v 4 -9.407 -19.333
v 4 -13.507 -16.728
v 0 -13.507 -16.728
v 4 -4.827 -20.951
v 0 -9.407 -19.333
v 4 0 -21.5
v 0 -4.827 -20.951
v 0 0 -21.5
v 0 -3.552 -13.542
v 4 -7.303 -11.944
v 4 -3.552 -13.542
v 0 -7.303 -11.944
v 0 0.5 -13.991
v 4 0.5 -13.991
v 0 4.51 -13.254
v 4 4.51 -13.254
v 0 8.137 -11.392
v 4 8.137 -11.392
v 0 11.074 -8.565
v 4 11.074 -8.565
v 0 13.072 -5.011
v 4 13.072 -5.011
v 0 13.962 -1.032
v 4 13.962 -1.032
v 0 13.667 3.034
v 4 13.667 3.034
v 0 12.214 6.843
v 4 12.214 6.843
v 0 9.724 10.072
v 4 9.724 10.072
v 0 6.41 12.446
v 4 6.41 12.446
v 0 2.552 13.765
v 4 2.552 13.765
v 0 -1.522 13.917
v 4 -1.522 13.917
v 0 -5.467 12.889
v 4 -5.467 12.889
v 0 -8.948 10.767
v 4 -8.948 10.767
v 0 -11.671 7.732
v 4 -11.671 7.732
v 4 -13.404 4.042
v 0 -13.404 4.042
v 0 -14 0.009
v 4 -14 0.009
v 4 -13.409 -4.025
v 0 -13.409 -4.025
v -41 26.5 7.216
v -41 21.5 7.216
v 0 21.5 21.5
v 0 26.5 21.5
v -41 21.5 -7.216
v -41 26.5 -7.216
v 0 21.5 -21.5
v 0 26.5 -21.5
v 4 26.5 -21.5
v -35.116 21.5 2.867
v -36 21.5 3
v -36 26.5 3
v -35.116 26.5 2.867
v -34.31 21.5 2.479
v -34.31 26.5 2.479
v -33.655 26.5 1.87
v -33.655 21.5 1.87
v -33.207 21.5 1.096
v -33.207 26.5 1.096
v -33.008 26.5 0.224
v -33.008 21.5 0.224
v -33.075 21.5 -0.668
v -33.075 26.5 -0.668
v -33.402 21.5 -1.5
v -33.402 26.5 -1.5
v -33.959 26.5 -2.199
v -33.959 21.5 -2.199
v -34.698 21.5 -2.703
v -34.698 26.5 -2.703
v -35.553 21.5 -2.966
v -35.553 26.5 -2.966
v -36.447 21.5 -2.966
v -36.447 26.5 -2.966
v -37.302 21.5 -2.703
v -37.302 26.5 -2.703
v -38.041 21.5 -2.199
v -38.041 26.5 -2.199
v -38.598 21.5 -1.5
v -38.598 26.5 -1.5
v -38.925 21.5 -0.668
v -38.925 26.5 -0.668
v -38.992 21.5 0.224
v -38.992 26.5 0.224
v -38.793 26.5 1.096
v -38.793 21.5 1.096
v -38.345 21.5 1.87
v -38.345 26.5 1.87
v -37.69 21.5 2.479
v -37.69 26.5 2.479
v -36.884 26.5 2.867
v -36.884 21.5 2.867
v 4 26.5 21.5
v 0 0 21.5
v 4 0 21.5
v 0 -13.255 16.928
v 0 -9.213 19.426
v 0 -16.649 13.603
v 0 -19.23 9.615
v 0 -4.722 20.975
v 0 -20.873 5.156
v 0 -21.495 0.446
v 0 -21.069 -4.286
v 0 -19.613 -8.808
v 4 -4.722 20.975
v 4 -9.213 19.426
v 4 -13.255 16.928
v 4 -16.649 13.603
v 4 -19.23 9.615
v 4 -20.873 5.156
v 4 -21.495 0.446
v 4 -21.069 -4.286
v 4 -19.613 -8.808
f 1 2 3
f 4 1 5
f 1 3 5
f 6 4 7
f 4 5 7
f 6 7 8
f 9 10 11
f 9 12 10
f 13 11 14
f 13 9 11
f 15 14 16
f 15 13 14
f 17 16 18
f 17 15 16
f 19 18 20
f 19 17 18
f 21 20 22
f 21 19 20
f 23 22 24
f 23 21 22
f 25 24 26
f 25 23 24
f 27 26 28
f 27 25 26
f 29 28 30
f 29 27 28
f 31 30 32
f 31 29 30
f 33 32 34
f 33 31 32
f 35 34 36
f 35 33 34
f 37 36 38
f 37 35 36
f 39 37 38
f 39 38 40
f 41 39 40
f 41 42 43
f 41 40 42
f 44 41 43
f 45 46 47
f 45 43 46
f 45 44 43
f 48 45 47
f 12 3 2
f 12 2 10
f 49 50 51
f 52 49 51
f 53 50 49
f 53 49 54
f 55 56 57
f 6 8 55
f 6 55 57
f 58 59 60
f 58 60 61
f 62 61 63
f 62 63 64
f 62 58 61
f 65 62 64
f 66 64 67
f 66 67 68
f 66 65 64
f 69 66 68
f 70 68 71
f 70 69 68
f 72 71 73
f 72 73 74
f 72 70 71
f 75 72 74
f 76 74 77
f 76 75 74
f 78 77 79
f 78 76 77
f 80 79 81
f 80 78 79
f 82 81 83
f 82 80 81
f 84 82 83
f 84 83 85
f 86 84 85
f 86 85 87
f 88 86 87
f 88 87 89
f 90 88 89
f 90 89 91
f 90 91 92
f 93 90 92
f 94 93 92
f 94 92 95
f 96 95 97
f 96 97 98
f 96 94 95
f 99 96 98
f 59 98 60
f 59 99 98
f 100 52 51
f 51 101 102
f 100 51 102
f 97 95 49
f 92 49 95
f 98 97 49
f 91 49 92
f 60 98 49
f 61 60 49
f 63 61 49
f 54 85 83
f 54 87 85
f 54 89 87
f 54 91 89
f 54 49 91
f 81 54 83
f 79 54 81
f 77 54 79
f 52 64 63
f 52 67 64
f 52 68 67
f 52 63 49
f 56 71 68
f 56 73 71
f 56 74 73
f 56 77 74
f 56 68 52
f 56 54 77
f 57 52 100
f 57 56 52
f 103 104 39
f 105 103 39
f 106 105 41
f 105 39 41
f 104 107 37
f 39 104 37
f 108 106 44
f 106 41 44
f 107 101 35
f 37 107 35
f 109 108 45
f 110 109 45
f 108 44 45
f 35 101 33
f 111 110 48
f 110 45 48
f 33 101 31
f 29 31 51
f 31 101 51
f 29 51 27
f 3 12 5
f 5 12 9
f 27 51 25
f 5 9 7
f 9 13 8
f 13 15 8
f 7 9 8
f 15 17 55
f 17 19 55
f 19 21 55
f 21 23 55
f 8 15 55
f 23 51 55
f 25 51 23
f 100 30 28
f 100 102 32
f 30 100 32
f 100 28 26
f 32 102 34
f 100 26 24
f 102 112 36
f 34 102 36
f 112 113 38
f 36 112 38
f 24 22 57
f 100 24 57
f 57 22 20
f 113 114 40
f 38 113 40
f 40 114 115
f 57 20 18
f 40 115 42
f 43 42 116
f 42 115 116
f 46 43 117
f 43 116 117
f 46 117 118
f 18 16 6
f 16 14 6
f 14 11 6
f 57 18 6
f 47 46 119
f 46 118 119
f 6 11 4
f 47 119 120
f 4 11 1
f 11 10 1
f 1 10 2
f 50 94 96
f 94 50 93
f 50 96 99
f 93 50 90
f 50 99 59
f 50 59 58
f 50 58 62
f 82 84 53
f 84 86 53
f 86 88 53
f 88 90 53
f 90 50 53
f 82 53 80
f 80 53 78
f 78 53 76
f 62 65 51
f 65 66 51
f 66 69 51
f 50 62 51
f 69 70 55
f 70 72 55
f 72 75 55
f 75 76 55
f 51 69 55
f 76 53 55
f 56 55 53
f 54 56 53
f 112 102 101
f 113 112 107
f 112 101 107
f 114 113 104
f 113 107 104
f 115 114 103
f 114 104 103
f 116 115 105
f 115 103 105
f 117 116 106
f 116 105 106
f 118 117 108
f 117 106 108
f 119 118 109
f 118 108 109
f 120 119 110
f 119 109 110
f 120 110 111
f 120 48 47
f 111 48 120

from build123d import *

# Parameters (mm, degrees)
SKETCH1_R                = 21.5
SKETCH1_R_2              = 14
BOSS_EXTRUDE1_DEPTH      = 4
BOSS_EXTRUDE2_REACH      = 50.242
BOSS_EXTRUDE2_END_RADIUS = 21.5
SKETCH2_W                = 4
SKETCH2_H                = 43
SKETCH2_3_W              = 45
SKETCH2_3_H              = 43
SKETCH2_3_R              = 3
BOSS_EXTRUDE3_DEPTH      = 5
CUT_EXTRUDE4_DEPTH       = 64.184254368
WIRE_BREAK_DEPTH         = 54.343228249


with BuildPart() as part:
    # Sketch1 → Boss-Extrude1 (new body)
    with BuildSketch(Plane(origin=(0, 0, 0), x_dir=(0, 0, -1), z_dir=(1, 0, 0))):
        Circle(SKETCH1_R)
        Circle(SKETCH1_R_2, mode=Mode.SUBTRACT)
    extrude(amount=BOSS_EXTRUDE1_DEPTH)

    # Boss-Extrude2: up to this cylinder (the profile starts outside it)
    boss_extrude2_end = Plane(origin=(2, 0, 0), z_dir=(-1, 0, 0)) * Cylinder(BOSS_EXTRUDE2_END_RADIUS, 144.484, mode=Mode.PRIVATE)
    # Sketch2 → Boss-Extrude2 (add, up to the surface)
    with BuildSketch(Plane(origin=(0, 21.5, 0), x_dir=(1, 0, 0), z_dir=(0, 1, 0)), mode=Mode.PRIVATE) as boss_extrude2_sk1:
        with Locations((2, 0)):
            Rectangle(SKETCH2_W, SKETCH2_H)
    boss_extrude2_tool1 = extrude(boss_extrude2_sk1.sketch, amount=-BOSS_EXTRUDE2_REACH, mode=Mode.PRIVATE) - boss_extrude2_end
    add(boss_extrude2_tool1.solids().sort_by_distance((2, 21.5, 0))[0])
    add(boss_extrude2_tool1.solids().sort_by_distance((2, 21.5, 0))[1])

    # Sketch2<3> → Boss-Extrude3 (add)
    with BuildSketch(Plane(origin=(0, 21.5, 0), x_dir=(1, 0, 0), z_dir=(0, 1, 0))):
        with Locations((-18.5, 0)):
            Rectangle(SKETCH2_3_W, SKETCH2_3_H)
        with Locations((-36, 0)):
            Circle(SKETCH2_3_R, mode=Mode.SUBTRACT)
    extrude(amount=BOSS_EXTRUDE3_DEPTH)

    # Sketch3 → Cut-Extrude4 (cut, through all)
    with BuildSketch(Plane.XZ.offset(-21.5)):
        Polygon((-41, -7.216009452), (-41, -28.471778575), (0, -28.471778575), (0, -21.5), align=None)
        Polygon((-41, 27.25128432), (-41, 7.216009452), (0, 21.5), (0, 27.25128432), align=None)
    extrude(amount=-CUT_EXTRUDE4_DEPTH, mode=Mode.SUBTRACT)

    # Sketch4 → wire break (cut, through all)
    with BuildSketch(Plane.ZY):
        Polygon((-3.959672524, 3.053030216), (3.959672524, -3.053030216), (-14.358508771, -26.811065363), (-22.27785382, -20.705004931), align=None)
    extrude(amount=-WIRE_BREAK_DEPTH, mode=Mode.SUBTRACT)


solid = part.part
